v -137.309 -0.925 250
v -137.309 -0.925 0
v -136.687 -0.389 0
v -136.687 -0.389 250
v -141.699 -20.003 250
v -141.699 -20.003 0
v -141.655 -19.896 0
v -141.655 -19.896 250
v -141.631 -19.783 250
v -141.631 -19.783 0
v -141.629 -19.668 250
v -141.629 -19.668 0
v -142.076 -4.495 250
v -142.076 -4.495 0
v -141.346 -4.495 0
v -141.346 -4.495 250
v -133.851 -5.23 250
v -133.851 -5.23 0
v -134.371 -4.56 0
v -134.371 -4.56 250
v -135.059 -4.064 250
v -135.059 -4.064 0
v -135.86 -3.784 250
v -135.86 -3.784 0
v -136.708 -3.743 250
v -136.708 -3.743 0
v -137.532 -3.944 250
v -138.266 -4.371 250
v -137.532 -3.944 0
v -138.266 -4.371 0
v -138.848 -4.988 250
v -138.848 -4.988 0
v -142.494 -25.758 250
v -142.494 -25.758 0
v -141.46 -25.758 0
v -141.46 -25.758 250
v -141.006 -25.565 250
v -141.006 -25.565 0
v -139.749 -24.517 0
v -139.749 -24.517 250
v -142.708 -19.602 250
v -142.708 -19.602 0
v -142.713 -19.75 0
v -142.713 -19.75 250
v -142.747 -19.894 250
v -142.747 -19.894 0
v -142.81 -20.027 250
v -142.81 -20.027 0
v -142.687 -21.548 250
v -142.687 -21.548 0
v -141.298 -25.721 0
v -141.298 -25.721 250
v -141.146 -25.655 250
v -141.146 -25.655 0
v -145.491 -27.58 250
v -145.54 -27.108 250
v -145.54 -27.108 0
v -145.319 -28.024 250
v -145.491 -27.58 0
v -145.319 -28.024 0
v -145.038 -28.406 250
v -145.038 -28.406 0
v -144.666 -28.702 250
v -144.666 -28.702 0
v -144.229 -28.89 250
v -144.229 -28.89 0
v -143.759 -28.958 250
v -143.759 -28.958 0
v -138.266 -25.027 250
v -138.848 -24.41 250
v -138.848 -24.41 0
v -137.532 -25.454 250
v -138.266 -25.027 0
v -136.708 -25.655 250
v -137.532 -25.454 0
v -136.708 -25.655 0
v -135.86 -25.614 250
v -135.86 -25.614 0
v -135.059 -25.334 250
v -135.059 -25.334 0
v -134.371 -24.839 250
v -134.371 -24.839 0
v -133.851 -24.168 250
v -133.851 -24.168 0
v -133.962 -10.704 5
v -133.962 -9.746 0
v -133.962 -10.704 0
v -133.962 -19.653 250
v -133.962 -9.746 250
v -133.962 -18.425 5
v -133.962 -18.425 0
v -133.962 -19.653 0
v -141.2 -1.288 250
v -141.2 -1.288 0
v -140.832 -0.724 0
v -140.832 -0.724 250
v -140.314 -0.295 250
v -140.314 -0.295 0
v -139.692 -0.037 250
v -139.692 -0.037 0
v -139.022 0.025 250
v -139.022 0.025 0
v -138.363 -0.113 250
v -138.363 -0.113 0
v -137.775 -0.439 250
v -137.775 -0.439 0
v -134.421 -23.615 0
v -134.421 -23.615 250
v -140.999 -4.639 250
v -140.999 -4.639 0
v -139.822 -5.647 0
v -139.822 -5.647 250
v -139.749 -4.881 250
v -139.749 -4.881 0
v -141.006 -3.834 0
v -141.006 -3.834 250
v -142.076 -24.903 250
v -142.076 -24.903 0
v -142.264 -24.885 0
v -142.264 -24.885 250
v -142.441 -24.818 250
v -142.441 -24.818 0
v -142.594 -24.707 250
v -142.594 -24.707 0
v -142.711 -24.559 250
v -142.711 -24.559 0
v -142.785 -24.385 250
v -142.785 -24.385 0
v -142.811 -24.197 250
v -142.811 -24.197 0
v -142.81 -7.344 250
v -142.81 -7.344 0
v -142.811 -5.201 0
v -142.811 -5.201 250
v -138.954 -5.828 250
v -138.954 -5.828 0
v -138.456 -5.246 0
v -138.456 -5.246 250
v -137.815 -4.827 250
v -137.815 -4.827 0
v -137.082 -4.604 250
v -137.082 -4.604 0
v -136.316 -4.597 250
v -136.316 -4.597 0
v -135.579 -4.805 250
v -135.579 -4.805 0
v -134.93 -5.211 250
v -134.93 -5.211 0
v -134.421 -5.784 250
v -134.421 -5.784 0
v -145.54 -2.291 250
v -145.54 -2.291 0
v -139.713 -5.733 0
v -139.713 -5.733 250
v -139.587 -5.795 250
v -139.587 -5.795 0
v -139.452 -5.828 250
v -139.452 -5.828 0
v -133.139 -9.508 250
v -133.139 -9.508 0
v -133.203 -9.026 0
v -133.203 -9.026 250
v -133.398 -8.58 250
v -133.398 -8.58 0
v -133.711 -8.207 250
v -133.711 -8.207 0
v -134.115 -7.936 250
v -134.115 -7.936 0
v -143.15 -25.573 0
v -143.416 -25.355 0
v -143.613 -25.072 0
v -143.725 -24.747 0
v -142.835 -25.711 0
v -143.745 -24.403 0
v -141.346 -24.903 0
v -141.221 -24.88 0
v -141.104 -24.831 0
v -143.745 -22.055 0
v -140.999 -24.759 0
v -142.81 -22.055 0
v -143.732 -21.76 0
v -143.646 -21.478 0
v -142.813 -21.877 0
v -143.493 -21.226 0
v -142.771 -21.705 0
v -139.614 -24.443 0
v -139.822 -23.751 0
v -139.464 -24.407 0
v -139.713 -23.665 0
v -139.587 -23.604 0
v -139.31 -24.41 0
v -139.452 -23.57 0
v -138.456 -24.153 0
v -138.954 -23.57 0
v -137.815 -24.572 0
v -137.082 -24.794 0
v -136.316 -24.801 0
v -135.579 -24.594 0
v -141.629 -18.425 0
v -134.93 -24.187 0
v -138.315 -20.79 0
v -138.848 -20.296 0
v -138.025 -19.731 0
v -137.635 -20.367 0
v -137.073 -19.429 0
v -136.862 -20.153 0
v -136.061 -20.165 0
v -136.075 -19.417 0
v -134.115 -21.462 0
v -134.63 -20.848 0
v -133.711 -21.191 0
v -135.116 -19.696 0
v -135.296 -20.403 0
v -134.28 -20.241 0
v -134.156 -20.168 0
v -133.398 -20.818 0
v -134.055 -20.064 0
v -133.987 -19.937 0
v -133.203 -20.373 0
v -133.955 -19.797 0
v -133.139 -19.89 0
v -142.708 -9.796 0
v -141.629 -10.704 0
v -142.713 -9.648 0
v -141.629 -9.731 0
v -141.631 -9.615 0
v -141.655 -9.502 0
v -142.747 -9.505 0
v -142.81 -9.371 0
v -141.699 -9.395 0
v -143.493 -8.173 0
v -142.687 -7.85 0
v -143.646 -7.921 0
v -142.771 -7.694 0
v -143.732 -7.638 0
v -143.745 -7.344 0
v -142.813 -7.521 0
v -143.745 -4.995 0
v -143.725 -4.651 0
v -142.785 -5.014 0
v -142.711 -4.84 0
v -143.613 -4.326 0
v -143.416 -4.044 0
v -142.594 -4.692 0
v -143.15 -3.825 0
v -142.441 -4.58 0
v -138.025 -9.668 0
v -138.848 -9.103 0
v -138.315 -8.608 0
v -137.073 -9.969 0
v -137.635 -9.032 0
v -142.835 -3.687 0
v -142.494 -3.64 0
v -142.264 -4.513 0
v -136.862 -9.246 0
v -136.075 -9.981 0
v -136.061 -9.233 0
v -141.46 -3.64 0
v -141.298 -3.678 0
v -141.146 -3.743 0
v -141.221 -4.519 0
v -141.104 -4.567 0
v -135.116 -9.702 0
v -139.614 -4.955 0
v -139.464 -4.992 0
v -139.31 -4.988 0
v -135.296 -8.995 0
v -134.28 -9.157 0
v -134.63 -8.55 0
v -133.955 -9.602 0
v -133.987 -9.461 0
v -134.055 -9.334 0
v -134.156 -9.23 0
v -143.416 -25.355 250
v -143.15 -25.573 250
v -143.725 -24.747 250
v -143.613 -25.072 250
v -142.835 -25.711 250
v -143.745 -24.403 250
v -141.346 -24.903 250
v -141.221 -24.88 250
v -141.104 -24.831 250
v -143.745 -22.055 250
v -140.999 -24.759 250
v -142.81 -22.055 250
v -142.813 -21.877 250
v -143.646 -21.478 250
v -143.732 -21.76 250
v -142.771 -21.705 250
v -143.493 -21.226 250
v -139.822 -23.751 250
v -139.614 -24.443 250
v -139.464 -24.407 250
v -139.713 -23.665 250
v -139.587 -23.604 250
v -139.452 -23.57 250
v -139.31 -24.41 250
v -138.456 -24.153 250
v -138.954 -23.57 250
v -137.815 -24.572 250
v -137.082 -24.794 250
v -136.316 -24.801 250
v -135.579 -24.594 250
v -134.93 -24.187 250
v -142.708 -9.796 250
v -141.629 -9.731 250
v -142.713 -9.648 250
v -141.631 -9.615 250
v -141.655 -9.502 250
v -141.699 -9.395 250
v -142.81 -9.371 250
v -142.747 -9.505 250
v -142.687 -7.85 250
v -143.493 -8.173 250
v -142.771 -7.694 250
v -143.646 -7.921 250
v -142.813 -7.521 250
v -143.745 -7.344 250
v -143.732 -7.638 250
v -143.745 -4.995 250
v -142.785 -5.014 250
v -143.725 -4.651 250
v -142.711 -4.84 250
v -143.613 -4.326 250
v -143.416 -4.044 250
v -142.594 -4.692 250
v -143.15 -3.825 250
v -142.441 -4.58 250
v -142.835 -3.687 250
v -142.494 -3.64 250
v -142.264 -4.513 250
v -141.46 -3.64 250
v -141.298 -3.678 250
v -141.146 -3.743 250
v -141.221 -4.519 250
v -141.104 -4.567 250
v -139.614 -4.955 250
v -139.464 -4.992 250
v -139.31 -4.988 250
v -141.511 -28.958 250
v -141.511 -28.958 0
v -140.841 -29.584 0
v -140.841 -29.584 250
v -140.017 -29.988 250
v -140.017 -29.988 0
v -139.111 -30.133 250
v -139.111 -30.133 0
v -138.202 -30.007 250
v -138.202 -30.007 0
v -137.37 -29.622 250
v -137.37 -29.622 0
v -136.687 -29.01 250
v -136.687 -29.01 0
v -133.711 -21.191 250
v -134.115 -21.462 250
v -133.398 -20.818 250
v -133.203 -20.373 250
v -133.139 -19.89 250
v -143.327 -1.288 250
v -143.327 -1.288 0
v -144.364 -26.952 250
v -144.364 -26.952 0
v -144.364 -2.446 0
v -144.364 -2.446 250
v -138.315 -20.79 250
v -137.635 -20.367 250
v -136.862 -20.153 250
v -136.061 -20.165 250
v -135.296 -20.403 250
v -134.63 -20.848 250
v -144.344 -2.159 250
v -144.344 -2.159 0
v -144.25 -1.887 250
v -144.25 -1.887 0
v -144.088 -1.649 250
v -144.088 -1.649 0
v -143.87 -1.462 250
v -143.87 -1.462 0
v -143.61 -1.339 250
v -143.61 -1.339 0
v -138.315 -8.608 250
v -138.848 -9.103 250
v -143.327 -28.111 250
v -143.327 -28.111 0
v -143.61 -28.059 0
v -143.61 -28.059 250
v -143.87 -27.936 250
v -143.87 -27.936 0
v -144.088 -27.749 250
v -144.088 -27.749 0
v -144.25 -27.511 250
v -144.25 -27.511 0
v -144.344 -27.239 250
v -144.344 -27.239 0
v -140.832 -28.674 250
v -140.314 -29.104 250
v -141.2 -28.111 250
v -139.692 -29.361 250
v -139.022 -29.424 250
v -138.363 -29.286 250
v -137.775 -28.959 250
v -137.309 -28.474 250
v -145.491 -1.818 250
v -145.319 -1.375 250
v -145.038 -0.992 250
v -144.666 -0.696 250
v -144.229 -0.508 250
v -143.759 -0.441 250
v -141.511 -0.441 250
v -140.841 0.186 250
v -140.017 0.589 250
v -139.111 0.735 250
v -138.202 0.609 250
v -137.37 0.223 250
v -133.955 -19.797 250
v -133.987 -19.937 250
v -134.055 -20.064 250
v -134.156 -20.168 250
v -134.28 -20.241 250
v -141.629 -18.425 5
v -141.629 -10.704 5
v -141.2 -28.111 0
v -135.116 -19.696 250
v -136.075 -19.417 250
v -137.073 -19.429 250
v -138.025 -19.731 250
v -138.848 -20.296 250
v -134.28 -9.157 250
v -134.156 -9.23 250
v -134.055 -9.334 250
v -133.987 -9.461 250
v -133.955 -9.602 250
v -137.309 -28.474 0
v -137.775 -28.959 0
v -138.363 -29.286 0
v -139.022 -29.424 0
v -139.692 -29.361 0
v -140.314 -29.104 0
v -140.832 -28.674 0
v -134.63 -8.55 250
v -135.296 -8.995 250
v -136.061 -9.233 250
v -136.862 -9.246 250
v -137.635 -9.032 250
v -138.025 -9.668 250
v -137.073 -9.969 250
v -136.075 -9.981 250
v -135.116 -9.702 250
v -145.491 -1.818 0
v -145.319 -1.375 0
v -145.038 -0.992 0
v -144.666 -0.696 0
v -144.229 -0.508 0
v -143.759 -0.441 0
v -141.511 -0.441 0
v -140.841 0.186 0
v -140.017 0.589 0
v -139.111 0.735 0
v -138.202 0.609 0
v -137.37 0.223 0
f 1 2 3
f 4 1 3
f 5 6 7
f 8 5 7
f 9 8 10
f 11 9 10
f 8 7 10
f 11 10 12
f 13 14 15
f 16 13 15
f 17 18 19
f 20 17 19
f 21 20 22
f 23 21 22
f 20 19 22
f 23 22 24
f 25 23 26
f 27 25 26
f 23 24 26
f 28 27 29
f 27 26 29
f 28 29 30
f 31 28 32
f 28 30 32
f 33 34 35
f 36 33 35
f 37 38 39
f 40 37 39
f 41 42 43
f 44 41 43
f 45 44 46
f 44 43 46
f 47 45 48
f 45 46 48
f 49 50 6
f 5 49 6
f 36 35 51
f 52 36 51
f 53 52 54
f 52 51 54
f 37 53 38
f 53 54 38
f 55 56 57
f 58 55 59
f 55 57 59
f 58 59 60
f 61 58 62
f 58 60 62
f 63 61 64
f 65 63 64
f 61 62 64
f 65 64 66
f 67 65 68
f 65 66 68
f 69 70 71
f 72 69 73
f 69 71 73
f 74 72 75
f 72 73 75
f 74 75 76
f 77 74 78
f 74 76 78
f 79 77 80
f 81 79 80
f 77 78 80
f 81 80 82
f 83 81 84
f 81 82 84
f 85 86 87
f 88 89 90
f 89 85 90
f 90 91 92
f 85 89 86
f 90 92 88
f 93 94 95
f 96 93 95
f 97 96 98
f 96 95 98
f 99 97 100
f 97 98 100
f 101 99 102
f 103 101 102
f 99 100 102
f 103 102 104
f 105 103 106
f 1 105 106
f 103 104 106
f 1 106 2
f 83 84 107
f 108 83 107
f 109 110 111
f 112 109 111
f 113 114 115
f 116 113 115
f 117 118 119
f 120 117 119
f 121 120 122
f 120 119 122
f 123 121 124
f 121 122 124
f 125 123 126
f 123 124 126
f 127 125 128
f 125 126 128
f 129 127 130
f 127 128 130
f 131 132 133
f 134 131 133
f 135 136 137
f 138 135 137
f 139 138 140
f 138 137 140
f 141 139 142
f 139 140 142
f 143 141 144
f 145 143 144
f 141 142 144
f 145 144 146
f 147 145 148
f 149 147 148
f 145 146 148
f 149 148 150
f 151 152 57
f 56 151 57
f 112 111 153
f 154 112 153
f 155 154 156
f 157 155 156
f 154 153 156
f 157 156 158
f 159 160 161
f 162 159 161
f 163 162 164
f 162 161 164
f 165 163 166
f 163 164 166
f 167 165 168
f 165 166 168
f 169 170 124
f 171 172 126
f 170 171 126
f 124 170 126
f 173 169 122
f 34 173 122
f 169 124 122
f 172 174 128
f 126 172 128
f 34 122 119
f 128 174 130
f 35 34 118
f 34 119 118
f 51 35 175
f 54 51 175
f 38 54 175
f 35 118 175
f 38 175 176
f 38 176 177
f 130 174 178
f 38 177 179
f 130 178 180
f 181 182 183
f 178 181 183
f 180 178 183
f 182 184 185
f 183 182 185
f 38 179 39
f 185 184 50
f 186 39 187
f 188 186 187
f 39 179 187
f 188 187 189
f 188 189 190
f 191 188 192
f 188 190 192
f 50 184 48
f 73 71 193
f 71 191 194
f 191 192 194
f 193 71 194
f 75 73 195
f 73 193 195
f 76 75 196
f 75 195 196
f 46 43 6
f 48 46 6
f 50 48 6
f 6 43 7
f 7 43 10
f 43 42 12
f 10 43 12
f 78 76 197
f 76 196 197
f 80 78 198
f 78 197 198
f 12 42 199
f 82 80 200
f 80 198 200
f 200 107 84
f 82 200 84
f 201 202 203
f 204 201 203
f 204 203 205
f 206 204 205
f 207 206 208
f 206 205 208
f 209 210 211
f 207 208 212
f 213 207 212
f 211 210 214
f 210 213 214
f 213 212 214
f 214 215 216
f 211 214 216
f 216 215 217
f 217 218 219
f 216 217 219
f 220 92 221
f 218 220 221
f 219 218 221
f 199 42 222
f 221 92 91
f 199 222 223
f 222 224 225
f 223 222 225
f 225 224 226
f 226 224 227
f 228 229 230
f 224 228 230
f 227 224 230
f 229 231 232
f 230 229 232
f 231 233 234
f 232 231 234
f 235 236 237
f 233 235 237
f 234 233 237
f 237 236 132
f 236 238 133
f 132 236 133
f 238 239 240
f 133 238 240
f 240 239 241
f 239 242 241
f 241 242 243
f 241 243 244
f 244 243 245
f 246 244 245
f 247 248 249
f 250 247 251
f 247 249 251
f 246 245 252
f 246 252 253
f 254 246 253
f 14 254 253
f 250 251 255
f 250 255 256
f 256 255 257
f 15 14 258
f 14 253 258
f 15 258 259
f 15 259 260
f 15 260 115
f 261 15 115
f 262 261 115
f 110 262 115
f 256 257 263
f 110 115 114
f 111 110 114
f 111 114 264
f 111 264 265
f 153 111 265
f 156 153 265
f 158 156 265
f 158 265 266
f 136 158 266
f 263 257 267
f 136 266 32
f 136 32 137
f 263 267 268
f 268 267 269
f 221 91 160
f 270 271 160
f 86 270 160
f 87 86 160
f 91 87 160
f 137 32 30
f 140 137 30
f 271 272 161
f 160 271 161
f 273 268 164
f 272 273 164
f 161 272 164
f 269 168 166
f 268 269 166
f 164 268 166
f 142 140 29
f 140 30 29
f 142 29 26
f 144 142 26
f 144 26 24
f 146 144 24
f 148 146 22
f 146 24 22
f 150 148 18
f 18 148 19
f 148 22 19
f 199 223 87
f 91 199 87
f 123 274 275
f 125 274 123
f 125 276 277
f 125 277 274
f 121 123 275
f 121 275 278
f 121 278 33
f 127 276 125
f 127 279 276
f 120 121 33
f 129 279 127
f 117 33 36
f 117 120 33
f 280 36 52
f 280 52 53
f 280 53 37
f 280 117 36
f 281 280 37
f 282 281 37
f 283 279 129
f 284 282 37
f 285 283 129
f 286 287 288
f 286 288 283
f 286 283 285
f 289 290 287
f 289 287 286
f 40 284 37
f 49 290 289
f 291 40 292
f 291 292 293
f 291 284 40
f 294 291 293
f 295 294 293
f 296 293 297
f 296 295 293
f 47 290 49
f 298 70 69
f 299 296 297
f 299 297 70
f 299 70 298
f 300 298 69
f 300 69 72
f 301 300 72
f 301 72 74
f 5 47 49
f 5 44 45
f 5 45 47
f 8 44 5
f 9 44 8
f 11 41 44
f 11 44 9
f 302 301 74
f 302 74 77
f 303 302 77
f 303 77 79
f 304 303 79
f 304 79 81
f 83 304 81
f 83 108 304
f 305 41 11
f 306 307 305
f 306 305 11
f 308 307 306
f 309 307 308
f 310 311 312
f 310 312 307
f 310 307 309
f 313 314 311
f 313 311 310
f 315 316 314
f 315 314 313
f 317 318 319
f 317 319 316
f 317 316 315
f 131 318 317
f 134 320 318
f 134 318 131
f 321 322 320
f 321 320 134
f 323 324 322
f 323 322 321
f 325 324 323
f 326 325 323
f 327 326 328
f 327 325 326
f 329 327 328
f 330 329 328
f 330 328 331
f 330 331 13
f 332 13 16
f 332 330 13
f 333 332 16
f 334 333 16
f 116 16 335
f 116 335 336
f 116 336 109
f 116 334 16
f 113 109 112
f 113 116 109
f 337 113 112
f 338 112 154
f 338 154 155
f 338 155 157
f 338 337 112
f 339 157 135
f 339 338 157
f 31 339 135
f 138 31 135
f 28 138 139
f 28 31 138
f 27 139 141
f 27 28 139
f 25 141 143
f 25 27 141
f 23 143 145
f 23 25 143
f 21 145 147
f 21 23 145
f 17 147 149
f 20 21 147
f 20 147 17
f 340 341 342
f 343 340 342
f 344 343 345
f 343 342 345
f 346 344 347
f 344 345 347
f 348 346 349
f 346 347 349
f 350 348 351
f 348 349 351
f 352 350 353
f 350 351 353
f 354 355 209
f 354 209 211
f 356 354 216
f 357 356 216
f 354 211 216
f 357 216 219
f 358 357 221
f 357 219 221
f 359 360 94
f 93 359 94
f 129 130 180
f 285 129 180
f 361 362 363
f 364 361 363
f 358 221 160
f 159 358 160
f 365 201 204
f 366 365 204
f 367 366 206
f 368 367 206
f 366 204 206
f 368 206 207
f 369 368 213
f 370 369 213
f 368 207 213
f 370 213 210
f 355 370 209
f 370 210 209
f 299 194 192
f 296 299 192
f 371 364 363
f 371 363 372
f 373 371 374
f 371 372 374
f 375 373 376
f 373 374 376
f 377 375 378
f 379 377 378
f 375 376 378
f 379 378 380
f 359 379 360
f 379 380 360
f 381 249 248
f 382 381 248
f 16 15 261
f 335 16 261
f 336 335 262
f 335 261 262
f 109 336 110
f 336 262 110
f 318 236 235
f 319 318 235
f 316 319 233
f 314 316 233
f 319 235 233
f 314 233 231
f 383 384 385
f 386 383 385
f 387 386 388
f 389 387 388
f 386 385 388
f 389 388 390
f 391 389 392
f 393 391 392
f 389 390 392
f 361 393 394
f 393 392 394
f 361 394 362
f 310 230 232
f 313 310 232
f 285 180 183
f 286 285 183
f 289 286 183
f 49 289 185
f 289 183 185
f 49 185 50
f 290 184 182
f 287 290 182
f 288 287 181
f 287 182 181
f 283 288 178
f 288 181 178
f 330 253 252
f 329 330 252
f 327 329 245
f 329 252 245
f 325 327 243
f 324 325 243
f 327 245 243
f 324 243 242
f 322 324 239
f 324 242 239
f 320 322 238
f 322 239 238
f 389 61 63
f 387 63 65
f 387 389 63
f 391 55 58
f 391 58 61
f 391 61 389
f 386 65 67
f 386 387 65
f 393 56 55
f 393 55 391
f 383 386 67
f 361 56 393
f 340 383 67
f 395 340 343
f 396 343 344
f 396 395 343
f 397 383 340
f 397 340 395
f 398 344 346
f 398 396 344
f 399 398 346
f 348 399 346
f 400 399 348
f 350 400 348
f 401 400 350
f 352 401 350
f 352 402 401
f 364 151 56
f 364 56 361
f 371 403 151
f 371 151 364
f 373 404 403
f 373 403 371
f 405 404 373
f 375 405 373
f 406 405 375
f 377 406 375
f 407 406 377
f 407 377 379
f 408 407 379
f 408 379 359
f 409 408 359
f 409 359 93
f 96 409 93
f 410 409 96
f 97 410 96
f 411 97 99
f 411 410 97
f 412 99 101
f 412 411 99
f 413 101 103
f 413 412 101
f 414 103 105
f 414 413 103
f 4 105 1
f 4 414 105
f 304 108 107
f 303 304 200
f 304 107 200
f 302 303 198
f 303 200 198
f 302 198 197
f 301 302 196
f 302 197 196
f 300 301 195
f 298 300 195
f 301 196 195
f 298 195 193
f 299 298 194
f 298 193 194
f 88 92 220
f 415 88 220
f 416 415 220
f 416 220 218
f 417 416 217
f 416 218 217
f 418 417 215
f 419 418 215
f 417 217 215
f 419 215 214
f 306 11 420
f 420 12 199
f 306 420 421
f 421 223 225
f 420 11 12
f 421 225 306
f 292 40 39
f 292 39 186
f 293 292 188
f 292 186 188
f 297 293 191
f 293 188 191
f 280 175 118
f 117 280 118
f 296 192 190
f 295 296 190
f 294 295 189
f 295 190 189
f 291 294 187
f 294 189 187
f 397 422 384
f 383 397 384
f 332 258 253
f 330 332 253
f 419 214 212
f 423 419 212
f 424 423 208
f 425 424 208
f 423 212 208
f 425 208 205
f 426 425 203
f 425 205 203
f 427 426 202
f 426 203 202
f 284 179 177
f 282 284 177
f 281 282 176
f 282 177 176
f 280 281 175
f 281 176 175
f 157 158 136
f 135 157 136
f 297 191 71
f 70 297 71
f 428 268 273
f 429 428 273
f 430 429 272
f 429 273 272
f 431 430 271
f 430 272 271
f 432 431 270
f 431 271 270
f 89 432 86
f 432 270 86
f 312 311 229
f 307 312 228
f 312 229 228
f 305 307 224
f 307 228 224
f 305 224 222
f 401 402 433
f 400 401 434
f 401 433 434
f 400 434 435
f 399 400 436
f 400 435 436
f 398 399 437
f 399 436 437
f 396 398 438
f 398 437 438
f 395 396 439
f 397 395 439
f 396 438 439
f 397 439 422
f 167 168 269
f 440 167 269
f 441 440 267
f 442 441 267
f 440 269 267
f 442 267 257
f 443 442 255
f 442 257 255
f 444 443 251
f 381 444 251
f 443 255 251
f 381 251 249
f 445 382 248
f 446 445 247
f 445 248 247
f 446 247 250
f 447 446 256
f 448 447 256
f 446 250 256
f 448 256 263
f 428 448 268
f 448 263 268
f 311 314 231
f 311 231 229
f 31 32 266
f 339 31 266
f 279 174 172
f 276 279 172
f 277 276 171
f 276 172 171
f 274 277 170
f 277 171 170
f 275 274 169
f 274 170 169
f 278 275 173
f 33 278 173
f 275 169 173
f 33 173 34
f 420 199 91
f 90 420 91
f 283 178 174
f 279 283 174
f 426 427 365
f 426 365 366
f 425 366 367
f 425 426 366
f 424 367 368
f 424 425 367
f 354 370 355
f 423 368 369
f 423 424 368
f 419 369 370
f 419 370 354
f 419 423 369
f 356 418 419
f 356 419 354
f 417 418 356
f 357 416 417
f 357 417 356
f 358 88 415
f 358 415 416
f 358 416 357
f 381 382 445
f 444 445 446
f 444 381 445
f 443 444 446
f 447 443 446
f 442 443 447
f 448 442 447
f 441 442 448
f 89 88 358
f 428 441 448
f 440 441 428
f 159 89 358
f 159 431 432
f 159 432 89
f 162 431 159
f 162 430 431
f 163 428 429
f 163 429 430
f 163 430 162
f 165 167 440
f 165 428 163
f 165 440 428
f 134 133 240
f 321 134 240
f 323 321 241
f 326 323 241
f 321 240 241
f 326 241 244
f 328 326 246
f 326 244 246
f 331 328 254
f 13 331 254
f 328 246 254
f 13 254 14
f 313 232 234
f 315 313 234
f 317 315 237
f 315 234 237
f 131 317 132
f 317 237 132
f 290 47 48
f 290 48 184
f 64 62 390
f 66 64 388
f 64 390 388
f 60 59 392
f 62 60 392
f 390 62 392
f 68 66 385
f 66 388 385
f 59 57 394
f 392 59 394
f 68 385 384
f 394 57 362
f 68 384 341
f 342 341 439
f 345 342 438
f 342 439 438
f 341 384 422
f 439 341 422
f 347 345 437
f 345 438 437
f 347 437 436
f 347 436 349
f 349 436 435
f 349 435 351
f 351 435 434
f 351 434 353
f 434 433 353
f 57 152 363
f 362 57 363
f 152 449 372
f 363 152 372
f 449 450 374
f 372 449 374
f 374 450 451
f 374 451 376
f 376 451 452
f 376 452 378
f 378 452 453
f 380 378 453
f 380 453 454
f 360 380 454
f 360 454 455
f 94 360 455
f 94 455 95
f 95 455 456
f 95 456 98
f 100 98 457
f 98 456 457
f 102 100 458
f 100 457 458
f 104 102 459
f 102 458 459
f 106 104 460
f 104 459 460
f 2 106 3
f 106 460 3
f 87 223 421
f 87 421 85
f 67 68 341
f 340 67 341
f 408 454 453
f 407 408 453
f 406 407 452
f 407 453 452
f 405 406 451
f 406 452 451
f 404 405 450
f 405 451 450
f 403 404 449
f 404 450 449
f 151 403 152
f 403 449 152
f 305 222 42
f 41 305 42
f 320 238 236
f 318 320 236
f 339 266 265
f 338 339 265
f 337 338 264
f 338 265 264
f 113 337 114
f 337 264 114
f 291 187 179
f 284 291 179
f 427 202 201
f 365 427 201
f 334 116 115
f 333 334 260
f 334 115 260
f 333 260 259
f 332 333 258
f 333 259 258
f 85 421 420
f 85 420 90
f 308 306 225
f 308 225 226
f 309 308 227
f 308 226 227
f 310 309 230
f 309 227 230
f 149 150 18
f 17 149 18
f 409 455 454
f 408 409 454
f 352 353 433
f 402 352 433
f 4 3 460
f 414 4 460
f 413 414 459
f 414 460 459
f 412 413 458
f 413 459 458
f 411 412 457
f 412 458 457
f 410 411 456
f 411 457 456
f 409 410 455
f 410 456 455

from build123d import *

# Parameters (mm, degrees)
F1_DEPTH = 250
F2_DEPTH = 250
F3_W     = 8.653239
F3_H     = 7.720554
F4_DEPTH = 5


with BuildPart() as f1:
    # F0 (on Top) → F1 (new body)
    with BuildSketch(Plane.XY):
        with BuildLine():
            Line((-137.309134, -0.924702), (-136.686638, -0.388667))
            ThreePointArc((-136.686638, -0.388667), (-139.111152, 0.734713), (-141.510949, -0.440541))
            Line((-141.510949, -0.440541), (-143.758833, -0.440541))
            ThreePointArc((-143.758833, -0.440541), (-145.03766, -0.991837), (-145.539865, -2.290726))
            Line((-145.539865, -2.290726), (-145.539865, -27.107602))
            ThreePointArc((-145.539865, -27.107602), (-145.03766, -28.406491), (-143.758833, -28.957787))
            Line((-143.758833, -28.957787), (-141.510949, -28.957787))
            ThreePointArc((-141.510949, -28.957787), (-139.111152, -30.133041), (-136.686638, -29.009661))
            Line((-136.686638, -29.009661), (-137.309134, -28.473626))
            ThreePointArc((-137.309134, -28.473626), (-139.359481, -29.417711), (-141.199708, -28.110506))
            Line((-141.199708, -28.110506), (-143.326551, -28.110506))
            ThreePointArc((-143.326551, -28.110506), (-144.088364, -27.748915), (-144.364044, -26.951979))
            Line((-144.364044, -26.951979), (-144.364044, -2.446349))
            ThreePointArc((-144.364044, -2.446349), (-144.088364, -1.649413), (-143.326551, -1.287822))
            Line((-143.326551, -1.287822), (-141.199708, -1.287822))
            ThreePointArc((-141.199708, -1.287822), (-139.359481, 0.019383), (-137.309134, -0.924702))
        make_face()
    extrude(amount=F1_DEPTH)


with BuildPart() as f2:
    # F0 (on Top) → F2 (new body)
    with BuildSketch(Plane.XY):
        with BuildLine():
            Line((-134.421453, -5.783599), (-133.850843, -5.230273))
            ThreePointArc((-133.850843, -5.230273), (-136.282789, -3.733067), (-138.848066, -4.988192))
            Line((-138.848066, -4.988192), (-139.310256, -4.988192))
            ThreePointArc((-139.310256, -4.988192), (-139.54019, -4.978449), (-139.748812, -4.88128))
            Line((-139.748812, -4.88128), (-141.006455, -3.833561))
            ThreePointArc((-141.006455, -3.833561), (-141.220469, -3.707043), (-141.45992, -3.640174))
            Line((-141.45992, -3.640174), (-142.493799, -3.640174))
            ThreePointArc((-142.493799, -3.640174), (-143.416023, -4.043703), (-143.745467, -4.994912))
            Line((-143.745467, -4.994912), (-143.745467, -7.343707))
            ThreePointArc((-143.745467, -7.343707), (-143.697942, -7.782221), (-143.492922, -8.17276))
            Line((-143.492922, -8.17276), (-142.810345, -9.37118))
            ThreePointArc((-142.810345, -9.37118), (-142.726242, -9.575669), (-142.70778, -9.796005))
            Line((-142.70778, -9.796005), (-142.70778, -19.602323))
            ThreePointArc((-142.70778, -19.602323), (-142.726242, -19.822659), (-142.810345, -20.027148))
            Line((-142.810345, -20.027148), (-143.492922, -21.225568))
            ThreePointArc((-143.492922, -21.225568), (-143.697942, -21.616107), (-143.745467, -22.054621))
            Line((-143.745467, -22.054621), (-143.745467, -24.403416))
            ThreePointArc((-143.745467, -24.403416), (-143.416023, -25.354625), (-142.493799, -25.758154))
            Line((-142.493799, -25.758154), (-141.45992, -25.758154))
            ThreePointArc((-141.45992, -25.758154), (-141.220469, -25.691284), (-141.006455, -25.564767))
            Line((-141.006455, -25.564767), (-139.748812, -24.517047))
            ThreePointArc((-139.748812, -24.517047), (-139.54019, -24.419879), (-139.310256, -24.410136))
            Line((-139.310256, -24.410136), (-138.848066, -24.410136))
            ThreePointArc((-138.848066, -24.410136), (-136.282789, -25.665261), (-133.850843, -24.168055))
            Line((-133.850843, -24.168055), (-134.421453, -23.614729))
            ThreePointArc((-134.421453, -23.614729), (-136.699606, -24.824974), (-138.953608, -23.570323))
            Line((-138.953608, -23.570323), (-139.452353, -23.570323))
            ThreePointArc((-139.452353, -23.570323), (-139.651642, -23.631075), (-139.821813, -23.751279))
            Line((-139.821813, -23.751279), (-140.999363, -24.75894))
            ThreePointArc((-140.999363, -24.75894), (-141.161457, -24.858468), (-141.34638, -24.903008))
            Line((-141.34638, -24.903008), (-142.075829, -24.903008))
            ThreePointArc((-142.075829, -24.903008), (-142.593578, -24.706761), (-142.810598, -24.197371))
            Line((-142.810598, -24.197371), (-142.810345, -22.054621))
            ThreePointArc((-142.810345, -22.054621), (-142.797704, -21.789488), (-142.687112, -21.54819))
            Line((-142.687112, -21.54819), (-141.69921, -20.00317))
            ThreePointArc((-141.69921, -20.00317), (-141.640342, -19.840411), (-141.629383, -19.66768))
            Line((-141.629383, -19.66768), (-141.629383, -9.730647))
            ThreePointArc((-141.629383, -9.730647), (-141.640342, -9.557917), (-141.69921, -9.395158))
            Line((-141.69921, -9.395158), (-142.687112, -7.850138))
            ThreePointArc((-142.687112, -7.850138), (-142.797704, -7.60884), (-142.810345, -7.343707))
            Line((-142.810345, -7.343707), (-142.810598, -5.200957))
            ThreePointArc((-142.810598, -5.200957), (-142.593578, -4.691567), (-142.075829, -4.495319))
            Line((-142.075829, -4.495319), (-141.34638, -4.495319))
            ThreePointArc((-141.34638, -4.495319), (-141.161457, -4.53986), (-140.999363, -4.639388))
            Line((-140.999363, -4.639388), (-139.821813, -5.647049))
            ThreePointArc((-139.821813, -5.647049), (-139.651642, -5.767253), (-139.452353, -5.828005))
            Line((-139.452353, -5.828005), (-138.953608, -5.828005))
            ThreePointArc((-138.953608, -5.828005), (-136.699606, -4.573354), (-134.421453, -5.783599))
        make_face()
        with BuildLine():
            ThreePointArc((-134.115353, -7.935948), (-136.061303, -9.23305), (-138.314977, -8.608434))
            Line((-138.314977, -8.608434), (-138.848066, -9.102507))
            ThreePointArc((-138.848066, -9.102507), (-136.57466, -10.01191), (-134.280056, -9.157404))
            ThreePointArc((-134.280056, -9.157404), (-134.016862, -9.395129), (-133.962363, -9.745578))
            Line((-133.962363, -9.745578), (-133.962363, -19.65275))
            ThreePointArc((-133.962363, -19.65275), (-134.016862, -20.003198), (-134.280056, -20.240923))
            ThreePointArc((-134.280056, -20.240923), (-136.57466, -19.386418), (-138.848066, -20.29582))
            Line((-138.848066, -20.29582), (-138.314977, -20.789893))
            ThreePointArc((-138.314977, -20.789893), (-136.061303, -20.165278), (-134.115353, -21.46238))
            ThreePointArc((-134.115353, -21.46238), (-133.39843, -20.818232), (-133.13891, -19.890032))
            Line((-133.13891, -19.890032), (-133.13891, -9.508296))
            ThreePointArc((-133.13891, -9.508296), (-133.39843, -8.580096), (-134.115353, -7.935948))
        make_face()
    extrude(amount=F2_DEPTH)

    # F3 (on Top) → F4 (join)
    with BuildSketch(Plane.XY):
        with Locations((-137.797169, -14.564424)):
            Rectangle(F3_W, F3_H)
    extrude(amount=F4_DEPTH)


solid = Compound([f1.part, f2.part])
